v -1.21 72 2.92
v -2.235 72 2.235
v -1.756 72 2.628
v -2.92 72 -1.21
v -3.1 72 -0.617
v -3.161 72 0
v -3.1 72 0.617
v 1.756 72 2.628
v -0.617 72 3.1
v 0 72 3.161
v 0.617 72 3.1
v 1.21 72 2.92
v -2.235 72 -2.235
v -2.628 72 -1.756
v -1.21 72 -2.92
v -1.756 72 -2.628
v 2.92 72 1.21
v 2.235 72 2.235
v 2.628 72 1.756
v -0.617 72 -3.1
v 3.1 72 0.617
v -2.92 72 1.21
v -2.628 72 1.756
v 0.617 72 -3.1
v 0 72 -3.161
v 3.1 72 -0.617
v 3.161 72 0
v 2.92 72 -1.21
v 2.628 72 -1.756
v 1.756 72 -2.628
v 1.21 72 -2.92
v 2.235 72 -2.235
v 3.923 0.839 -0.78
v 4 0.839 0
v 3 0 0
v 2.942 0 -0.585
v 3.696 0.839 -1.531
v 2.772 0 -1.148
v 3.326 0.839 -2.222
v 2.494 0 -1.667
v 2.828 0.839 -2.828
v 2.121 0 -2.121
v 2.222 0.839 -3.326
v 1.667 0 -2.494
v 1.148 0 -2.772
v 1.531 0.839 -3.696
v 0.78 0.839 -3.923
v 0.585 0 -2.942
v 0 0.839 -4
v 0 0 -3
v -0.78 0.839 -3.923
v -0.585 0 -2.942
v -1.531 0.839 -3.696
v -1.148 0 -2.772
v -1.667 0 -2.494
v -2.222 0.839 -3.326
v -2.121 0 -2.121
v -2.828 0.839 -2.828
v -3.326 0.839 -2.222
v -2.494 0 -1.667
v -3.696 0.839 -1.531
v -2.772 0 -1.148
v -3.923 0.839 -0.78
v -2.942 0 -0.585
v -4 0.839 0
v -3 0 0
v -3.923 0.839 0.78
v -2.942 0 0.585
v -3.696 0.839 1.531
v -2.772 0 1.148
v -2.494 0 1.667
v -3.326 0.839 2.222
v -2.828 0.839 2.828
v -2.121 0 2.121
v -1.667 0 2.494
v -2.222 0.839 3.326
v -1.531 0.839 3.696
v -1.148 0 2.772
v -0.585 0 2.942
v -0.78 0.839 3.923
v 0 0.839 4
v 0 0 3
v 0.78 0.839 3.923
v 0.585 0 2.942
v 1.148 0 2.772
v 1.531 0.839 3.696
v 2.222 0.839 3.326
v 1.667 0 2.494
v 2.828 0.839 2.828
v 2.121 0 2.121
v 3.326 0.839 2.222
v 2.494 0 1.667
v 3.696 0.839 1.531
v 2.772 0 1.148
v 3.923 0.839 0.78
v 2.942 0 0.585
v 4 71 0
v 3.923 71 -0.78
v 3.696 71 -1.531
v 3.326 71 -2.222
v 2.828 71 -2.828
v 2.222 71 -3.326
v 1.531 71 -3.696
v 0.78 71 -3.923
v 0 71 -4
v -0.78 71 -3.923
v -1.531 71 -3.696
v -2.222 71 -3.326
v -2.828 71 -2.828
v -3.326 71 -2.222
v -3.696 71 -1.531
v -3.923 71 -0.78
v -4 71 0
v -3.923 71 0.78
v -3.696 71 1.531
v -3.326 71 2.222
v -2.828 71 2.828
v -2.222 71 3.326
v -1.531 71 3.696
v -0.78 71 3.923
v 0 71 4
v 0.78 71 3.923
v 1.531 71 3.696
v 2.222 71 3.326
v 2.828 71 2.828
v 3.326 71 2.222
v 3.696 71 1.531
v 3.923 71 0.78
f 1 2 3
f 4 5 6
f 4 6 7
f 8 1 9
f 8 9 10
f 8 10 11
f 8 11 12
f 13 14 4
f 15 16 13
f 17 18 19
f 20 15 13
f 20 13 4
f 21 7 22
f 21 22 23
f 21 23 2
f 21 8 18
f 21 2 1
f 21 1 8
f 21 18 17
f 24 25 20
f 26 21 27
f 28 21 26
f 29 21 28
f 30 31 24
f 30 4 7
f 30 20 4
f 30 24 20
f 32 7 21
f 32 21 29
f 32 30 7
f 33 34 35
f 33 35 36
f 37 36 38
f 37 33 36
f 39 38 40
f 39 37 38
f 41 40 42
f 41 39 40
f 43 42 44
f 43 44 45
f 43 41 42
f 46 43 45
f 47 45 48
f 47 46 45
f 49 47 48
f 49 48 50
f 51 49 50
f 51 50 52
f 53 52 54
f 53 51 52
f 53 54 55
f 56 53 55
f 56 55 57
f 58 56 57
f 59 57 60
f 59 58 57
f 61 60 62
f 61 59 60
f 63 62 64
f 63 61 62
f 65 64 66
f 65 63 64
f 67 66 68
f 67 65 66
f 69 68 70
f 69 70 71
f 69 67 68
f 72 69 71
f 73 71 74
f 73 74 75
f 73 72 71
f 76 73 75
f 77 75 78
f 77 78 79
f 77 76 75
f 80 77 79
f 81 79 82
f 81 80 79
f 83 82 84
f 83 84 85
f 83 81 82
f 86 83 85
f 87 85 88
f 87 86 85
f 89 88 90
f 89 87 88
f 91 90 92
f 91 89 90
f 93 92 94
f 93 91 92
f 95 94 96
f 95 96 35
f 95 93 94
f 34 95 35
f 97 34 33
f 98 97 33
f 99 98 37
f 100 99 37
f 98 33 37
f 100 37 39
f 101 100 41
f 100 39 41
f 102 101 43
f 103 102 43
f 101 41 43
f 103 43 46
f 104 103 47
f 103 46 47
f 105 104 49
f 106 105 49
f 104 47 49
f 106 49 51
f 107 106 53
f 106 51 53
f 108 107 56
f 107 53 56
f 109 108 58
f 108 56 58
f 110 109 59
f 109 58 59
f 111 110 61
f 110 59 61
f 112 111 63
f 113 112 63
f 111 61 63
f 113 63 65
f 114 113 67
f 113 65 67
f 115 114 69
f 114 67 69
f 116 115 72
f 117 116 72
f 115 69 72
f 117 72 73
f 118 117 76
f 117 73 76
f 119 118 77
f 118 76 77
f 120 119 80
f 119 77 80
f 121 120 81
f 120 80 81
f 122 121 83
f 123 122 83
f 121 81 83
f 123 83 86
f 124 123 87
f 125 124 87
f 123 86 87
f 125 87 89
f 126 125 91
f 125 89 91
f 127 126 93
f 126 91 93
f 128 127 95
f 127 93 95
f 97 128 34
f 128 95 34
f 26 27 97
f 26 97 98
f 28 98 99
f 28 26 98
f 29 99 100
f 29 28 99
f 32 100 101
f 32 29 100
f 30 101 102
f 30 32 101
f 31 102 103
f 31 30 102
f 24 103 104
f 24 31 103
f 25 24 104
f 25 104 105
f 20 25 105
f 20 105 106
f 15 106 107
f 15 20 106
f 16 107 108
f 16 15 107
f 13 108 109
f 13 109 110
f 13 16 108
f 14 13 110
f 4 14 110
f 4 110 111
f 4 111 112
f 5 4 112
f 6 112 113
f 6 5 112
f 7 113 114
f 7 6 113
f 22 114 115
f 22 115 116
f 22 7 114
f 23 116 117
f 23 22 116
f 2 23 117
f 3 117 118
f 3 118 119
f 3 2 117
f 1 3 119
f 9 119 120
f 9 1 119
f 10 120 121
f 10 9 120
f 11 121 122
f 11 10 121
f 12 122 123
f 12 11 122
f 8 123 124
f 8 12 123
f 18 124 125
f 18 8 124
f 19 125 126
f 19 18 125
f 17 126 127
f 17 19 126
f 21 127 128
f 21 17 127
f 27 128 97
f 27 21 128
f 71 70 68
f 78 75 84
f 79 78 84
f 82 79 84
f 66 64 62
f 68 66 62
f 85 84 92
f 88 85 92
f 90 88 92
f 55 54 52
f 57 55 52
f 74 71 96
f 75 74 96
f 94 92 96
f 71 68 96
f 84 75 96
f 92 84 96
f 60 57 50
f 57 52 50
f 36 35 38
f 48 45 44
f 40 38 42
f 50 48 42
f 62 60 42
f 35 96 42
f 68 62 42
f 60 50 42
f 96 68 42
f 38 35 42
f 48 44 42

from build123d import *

# Parameters (mm, degrees)
ESQUISSE1_R             = 4
BOSS_EXTRU_1_DEPTH      = 72
CHANFREIN1_SIZE         = 1
CHANFREIN1_SIZE2        = 0.839099631
CHANFREIN1_PART_2_SIZE  = 1
CHANFREIN1_PART_2_SIZE2 = 0.839099631


with BuildPart() as part:
    # Esquisse1 → Boss.-Extru.1 (new body)
    with BuildSketch(Plane(origin=(0, 0, 0), x_dir=(1, 0, 0), z_dir=(0, 1, 0))):
        Circle(ESQUISSE1_R)
    extrude(amount=BOSS_EXTRU_1_DEPTH)

    # Chanfrein1
    chanfrein1_edges = [part.edges().sort_by_distance(p)[0] for p in [
        (-4, 0, 0),
    ]]
    chanfrein1_side = [part.faces().sort_by_distance(p)[0] for p in [
        (0, 0, 0),
    ]]
    chamfer(chanfrein1_edges, length=CHANFREIN1_SIZE, length2=CHANFREIN1_SIZE2, reference=chanfrein1_side[0])

    # Chanfrein1 part 2
    chanfrein1_part_2_edges = [part.edges().sort_by_distance(p)[0] for p in [
        (-4, 72, 0),
    ]]
    chanfrein1_part_2_side = [part.faces().sort_by_distance(p)[0] for p in [
        (-4, 36, 0),
    ]]
    chamfer(chanfrein1_part_2_edges, length=CHANFREIN1_PART_2_SIZE, length2=CHANFREIN1_PART_2_SIZE2, reference=chanfrein1_part_2_side[0])


solid = part.part
